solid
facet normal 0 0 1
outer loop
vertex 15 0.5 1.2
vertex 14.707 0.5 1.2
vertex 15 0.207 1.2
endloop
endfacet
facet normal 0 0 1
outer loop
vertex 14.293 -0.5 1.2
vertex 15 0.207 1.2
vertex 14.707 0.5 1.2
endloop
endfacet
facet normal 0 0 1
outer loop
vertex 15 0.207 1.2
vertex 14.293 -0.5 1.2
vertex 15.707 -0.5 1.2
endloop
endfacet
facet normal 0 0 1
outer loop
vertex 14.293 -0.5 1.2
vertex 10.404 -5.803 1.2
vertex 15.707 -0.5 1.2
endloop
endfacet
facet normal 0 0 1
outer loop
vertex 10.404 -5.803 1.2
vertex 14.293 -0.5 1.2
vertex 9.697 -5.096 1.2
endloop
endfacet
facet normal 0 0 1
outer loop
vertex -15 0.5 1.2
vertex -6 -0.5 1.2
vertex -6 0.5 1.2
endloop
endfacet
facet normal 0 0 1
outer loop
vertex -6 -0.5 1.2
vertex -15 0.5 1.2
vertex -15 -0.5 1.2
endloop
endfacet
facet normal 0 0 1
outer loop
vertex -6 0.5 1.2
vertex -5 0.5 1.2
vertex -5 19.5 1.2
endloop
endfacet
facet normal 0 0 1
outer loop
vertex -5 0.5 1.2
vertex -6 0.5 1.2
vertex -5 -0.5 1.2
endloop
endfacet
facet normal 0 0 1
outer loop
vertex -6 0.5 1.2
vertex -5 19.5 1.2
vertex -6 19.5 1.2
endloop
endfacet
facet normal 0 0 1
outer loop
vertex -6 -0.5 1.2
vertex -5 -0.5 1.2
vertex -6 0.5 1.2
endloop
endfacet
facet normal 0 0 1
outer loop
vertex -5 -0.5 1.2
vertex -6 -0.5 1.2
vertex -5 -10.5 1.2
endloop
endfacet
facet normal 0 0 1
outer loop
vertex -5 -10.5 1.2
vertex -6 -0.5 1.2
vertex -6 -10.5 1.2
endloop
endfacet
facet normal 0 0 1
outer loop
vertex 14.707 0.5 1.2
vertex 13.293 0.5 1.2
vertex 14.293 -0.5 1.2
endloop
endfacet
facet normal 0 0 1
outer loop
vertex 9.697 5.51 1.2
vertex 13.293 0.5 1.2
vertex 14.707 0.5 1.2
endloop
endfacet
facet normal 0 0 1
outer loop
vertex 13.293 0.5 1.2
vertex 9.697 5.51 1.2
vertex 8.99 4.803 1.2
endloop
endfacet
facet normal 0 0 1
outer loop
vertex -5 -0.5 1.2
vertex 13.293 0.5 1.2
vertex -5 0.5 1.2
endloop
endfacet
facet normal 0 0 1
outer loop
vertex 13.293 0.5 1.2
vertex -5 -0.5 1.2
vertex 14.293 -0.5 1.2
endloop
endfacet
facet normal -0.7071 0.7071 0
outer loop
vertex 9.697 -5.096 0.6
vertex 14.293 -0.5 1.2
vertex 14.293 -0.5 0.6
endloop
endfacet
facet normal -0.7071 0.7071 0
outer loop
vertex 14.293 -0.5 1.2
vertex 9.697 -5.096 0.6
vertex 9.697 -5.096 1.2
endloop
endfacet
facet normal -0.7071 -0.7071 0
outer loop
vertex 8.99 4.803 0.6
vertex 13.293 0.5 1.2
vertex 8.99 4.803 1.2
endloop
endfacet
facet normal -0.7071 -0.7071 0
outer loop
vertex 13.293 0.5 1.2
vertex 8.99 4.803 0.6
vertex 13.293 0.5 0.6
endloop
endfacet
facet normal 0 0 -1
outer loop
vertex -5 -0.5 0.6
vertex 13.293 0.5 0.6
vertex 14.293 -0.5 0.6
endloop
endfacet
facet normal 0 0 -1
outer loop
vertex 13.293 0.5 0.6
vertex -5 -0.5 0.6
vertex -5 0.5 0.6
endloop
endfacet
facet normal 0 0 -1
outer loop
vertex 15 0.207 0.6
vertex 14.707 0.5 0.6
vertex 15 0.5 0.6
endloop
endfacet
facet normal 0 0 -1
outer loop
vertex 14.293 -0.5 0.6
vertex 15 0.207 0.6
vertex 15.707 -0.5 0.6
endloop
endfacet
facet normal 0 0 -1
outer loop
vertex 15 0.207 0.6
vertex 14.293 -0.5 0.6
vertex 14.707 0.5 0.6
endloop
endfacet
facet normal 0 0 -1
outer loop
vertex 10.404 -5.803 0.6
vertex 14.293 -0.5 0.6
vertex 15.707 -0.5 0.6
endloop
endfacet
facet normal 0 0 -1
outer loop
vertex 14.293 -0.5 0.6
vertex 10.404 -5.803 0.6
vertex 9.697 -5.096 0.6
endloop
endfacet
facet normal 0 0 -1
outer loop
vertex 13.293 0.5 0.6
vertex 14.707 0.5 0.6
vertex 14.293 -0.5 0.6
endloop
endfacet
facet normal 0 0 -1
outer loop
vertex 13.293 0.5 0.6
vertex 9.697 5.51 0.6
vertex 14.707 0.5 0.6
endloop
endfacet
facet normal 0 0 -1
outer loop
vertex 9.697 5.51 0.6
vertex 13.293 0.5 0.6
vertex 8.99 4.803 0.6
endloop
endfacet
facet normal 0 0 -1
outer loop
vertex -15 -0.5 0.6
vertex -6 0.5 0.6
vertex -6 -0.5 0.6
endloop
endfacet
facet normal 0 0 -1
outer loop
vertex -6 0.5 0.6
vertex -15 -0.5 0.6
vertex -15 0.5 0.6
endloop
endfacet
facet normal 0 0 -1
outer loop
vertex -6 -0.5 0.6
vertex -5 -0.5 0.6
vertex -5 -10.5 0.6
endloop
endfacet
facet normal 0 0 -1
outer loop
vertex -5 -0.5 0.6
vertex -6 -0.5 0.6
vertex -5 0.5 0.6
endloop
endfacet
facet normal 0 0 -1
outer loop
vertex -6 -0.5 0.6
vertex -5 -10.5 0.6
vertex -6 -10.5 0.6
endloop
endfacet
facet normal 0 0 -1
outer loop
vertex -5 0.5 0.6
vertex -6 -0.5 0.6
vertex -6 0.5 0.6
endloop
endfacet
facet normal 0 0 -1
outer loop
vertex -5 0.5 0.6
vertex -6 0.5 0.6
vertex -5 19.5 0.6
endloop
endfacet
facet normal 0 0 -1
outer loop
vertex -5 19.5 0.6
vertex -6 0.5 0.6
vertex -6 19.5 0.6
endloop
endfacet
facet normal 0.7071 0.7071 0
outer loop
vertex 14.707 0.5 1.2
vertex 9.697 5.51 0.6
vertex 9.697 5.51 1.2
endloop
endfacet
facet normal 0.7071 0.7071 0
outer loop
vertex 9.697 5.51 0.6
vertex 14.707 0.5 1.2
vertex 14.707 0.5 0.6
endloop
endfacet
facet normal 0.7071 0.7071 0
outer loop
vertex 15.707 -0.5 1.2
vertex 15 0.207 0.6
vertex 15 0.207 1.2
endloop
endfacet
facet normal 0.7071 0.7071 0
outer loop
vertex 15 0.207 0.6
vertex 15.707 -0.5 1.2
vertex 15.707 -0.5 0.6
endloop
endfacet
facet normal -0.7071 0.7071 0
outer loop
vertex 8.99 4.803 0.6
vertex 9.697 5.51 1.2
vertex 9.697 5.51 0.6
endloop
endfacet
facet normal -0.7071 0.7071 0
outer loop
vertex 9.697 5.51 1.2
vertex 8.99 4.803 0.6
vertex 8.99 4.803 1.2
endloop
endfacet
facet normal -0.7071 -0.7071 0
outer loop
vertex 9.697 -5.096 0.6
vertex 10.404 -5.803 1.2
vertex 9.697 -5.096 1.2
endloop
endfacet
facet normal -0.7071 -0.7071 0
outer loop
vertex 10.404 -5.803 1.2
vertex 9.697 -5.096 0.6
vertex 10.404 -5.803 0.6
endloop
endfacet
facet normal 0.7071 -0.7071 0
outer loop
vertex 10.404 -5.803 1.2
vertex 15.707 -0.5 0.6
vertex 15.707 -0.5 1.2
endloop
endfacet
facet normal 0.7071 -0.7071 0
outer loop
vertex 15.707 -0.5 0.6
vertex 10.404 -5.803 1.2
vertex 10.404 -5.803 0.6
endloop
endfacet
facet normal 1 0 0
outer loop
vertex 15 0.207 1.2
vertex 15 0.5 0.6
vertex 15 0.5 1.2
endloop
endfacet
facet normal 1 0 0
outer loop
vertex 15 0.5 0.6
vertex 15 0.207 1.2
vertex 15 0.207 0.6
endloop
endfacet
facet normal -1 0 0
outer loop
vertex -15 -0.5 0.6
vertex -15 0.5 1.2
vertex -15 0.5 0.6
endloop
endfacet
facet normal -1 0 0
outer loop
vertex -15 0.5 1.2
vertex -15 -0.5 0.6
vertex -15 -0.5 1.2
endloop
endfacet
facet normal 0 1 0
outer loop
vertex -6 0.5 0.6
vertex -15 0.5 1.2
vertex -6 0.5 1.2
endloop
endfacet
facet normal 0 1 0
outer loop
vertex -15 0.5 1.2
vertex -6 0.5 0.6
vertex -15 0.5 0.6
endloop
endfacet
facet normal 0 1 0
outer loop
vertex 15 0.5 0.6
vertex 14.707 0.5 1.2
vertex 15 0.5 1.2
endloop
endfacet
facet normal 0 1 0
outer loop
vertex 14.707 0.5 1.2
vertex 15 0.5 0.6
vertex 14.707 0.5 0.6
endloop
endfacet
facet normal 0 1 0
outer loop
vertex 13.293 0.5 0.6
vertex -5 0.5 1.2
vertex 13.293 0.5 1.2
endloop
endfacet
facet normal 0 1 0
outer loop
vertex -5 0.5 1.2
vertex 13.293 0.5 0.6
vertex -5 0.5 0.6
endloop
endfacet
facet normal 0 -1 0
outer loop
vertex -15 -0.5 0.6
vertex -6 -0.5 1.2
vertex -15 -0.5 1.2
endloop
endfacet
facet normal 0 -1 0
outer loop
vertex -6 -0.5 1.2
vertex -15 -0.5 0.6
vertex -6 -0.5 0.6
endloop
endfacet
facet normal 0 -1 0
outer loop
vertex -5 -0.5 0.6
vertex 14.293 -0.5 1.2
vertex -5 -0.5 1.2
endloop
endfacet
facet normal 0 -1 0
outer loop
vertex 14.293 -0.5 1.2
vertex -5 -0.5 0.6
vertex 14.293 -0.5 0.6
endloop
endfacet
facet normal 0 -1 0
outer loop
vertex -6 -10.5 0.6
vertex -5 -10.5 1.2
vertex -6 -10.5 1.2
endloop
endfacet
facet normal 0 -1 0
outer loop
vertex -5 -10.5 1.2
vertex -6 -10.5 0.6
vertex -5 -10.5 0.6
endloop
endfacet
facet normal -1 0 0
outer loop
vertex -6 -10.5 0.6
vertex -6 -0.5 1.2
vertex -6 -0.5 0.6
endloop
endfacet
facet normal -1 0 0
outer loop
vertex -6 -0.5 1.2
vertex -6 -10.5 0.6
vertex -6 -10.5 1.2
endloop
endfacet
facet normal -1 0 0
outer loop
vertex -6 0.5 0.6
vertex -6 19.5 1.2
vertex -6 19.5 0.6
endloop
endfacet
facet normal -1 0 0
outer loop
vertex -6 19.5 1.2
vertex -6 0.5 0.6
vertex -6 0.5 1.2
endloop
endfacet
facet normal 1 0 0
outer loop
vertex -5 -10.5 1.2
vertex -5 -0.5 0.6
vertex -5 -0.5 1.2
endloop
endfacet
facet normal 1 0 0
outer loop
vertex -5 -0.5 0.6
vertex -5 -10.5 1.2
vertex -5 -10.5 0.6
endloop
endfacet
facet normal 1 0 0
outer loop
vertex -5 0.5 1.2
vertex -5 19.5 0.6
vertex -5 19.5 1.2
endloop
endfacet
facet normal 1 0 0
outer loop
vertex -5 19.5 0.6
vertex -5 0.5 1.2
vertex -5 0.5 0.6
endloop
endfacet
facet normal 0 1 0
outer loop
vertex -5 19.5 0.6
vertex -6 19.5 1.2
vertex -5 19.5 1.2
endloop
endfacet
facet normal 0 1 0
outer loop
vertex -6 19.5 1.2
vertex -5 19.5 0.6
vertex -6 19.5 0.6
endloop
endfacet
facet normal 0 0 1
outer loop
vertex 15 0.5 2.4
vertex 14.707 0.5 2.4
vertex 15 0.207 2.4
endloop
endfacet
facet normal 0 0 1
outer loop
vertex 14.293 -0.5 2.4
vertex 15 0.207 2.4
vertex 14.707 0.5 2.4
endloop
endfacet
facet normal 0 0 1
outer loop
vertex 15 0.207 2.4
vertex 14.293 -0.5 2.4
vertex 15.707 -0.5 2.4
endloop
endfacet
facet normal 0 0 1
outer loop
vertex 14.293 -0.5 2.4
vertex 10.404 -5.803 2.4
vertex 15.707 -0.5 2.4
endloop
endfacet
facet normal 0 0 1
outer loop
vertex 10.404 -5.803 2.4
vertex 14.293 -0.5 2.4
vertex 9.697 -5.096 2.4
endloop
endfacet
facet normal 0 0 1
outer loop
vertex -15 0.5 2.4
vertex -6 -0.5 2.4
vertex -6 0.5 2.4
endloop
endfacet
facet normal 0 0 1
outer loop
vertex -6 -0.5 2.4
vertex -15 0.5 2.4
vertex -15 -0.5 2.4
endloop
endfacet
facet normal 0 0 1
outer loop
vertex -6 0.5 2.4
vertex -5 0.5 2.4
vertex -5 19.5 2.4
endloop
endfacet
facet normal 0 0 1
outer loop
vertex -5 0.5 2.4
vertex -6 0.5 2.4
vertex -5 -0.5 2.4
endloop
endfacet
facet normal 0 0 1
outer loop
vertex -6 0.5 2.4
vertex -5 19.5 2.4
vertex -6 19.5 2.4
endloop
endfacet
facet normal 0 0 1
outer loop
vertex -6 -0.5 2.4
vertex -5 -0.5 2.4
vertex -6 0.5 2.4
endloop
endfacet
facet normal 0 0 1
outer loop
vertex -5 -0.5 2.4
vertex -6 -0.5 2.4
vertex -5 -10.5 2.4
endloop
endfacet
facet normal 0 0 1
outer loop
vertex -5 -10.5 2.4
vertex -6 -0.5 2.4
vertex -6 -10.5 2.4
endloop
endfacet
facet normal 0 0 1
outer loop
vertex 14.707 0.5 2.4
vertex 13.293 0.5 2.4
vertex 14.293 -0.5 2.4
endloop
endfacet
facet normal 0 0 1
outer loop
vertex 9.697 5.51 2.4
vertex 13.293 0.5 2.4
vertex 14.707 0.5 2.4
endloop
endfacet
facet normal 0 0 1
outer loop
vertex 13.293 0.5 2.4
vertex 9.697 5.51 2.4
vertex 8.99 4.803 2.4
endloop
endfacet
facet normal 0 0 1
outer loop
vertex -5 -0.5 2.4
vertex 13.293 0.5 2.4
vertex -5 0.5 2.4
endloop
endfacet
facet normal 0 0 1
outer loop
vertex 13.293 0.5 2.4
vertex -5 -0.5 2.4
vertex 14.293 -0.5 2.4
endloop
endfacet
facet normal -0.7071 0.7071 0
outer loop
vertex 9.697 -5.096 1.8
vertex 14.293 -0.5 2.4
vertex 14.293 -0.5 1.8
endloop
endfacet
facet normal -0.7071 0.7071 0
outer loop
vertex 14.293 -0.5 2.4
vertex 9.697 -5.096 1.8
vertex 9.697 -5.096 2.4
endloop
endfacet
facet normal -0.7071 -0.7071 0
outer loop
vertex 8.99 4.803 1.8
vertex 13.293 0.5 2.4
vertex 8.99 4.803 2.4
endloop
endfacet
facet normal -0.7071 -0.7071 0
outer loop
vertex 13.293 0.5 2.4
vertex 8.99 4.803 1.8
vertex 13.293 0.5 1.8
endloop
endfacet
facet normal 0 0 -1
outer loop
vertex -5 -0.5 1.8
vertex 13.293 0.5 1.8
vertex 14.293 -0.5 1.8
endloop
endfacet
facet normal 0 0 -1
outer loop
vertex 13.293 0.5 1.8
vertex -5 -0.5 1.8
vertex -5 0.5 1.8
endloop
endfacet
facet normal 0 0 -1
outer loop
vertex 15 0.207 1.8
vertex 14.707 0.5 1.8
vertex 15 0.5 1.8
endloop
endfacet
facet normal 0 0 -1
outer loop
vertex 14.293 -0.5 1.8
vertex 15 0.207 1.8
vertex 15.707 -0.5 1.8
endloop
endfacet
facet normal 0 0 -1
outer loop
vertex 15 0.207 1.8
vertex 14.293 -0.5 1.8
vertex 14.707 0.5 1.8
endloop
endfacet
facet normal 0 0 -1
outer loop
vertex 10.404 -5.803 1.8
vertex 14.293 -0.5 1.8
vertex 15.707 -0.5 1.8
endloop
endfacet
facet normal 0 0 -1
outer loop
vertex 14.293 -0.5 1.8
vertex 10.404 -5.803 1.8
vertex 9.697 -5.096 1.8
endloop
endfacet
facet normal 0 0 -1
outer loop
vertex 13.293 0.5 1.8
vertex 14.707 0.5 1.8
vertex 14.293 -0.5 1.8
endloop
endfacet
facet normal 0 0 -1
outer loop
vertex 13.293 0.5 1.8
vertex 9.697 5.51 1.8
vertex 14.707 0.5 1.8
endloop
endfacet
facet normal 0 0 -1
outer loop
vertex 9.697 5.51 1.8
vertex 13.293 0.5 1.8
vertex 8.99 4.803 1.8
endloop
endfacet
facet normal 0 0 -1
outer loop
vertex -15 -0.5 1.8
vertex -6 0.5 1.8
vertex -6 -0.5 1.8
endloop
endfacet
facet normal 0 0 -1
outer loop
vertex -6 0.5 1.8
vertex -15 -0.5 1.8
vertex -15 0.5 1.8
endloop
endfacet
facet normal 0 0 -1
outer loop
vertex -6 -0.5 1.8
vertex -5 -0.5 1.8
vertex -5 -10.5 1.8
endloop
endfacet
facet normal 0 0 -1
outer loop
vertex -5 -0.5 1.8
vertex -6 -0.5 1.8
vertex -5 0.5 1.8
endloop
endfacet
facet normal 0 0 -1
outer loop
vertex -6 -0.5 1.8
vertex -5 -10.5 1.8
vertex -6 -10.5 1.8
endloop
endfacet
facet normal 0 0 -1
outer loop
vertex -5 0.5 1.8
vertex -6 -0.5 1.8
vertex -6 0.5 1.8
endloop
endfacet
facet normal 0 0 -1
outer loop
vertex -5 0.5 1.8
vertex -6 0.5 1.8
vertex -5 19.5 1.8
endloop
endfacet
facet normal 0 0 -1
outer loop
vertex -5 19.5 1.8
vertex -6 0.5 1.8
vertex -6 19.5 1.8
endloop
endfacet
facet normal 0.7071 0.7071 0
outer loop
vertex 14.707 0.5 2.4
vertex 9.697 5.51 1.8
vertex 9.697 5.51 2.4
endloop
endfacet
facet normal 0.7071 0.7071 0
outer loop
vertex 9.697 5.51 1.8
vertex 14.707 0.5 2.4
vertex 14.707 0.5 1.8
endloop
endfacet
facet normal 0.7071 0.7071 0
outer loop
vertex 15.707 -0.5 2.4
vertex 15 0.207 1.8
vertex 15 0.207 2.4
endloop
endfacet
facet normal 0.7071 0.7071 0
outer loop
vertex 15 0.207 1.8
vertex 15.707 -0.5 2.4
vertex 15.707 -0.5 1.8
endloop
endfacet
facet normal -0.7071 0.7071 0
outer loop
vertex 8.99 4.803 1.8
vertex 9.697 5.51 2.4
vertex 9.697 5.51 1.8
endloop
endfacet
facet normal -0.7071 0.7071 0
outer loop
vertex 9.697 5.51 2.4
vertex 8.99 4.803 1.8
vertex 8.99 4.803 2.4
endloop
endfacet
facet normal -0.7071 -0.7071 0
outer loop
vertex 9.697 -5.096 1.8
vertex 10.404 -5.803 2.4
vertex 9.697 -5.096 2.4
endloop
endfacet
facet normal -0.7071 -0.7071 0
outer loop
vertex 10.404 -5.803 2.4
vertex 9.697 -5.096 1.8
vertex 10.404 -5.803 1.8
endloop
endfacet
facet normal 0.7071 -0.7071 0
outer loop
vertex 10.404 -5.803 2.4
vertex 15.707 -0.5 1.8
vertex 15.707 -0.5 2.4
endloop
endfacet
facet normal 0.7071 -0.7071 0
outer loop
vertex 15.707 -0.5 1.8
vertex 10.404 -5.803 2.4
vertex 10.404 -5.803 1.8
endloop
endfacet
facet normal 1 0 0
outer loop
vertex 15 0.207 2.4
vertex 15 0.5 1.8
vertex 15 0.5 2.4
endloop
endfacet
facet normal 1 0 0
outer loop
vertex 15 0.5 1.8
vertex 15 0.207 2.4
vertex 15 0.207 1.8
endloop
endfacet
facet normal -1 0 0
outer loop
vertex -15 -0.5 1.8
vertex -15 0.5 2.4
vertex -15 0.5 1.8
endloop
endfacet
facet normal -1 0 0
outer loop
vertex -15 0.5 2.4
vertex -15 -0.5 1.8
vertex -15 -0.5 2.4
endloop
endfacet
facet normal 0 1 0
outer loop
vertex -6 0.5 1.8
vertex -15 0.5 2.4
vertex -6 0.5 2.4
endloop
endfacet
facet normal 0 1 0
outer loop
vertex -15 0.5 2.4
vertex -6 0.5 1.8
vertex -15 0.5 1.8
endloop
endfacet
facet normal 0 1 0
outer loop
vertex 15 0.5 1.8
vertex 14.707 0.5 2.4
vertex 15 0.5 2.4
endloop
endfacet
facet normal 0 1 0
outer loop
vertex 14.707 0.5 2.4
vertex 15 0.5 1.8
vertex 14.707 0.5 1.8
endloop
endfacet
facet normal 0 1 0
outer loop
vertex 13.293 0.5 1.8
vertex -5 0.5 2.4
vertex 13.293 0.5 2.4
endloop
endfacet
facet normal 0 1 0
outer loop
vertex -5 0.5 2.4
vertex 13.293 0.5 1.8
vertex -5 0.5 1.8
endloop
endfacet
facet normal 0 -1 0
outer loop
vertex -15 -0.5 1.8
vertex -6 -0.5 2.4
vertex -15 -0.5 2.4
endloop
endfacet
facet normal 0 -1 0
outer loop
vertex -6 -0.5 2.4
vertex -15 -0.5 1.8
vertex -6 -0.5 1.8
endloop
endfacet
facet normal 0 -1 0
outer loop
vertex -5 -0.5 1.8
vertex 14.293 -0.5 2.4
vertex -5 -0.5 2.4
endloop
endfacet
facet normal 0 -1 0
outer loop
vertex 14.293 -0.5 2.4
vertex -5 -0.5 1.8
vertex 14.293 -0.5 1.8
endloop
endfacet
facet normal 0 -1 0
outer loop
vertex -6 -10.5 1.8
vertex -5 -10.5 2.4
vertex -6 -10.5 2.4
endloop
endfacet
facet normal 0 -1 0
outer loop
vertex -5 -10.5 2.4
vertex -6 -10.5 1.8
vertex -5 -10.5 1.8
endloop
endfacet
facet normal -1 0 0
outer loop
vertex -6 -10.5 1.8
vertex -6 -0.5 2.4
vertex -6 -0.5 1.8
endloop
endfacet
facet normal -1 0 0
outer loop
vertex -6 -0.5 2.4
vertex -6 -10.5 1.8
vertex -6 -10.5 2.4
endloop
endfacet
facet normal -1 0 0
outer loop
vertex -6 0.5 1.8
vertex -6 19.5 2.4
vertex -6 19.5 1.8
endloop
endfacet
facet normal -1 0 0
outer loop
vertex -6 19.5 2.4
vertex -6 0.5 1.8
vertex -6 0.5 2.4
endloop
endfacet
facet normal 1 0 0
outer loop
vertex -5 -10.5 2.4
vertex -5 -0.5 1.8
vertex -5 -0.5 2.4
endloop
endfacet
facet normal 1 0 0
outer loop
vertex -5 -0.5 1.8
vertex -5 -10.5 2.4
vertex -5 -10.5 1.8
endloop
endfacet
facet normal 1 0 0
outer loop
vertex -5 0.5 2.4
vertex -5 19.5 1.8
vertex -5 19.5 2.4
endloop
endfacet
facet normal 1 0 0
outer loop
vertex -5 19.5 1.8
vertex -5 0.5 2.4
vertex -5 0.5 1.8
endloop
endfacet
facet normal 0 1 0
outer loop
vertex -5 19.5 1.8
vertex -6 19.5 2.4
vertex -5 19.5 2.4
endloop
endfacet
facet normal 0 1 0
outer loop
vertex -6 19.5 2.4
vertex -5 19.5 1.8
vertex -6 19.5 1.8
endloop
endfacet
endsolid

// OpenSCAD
red = 1;
green = 0;

length = 30;
width = 1;
layer_height = .3;
layers_per_color = 2;
height_per_color = layer_height * layers_per_color;

module l()
{
    translate([-length/2,-width/2,0])
    {
        cube([length, width, height_per_color]);
        translate([length,sqrt(.5),0])
        {
            rotate([0,0,135])
                cube([length/4,width, height_per_color]);
            rotate([0,0,-135])
                cube([length/4,width, height_per_color]);
        }
    
       translate([length/3,-length/3,0])
        rotate([0,0,90])
         cube([length, width, height_per_color]);
    }
    
}

if (green == 1)
color("green")
for (i=[0,2])
{
    translate([0,0,i*height_per_color])
    l();
}

if (red == 1)
color("red")
for (i=[1,3])
{
    translate([0,0,i*height_per_color])
    l();
}
